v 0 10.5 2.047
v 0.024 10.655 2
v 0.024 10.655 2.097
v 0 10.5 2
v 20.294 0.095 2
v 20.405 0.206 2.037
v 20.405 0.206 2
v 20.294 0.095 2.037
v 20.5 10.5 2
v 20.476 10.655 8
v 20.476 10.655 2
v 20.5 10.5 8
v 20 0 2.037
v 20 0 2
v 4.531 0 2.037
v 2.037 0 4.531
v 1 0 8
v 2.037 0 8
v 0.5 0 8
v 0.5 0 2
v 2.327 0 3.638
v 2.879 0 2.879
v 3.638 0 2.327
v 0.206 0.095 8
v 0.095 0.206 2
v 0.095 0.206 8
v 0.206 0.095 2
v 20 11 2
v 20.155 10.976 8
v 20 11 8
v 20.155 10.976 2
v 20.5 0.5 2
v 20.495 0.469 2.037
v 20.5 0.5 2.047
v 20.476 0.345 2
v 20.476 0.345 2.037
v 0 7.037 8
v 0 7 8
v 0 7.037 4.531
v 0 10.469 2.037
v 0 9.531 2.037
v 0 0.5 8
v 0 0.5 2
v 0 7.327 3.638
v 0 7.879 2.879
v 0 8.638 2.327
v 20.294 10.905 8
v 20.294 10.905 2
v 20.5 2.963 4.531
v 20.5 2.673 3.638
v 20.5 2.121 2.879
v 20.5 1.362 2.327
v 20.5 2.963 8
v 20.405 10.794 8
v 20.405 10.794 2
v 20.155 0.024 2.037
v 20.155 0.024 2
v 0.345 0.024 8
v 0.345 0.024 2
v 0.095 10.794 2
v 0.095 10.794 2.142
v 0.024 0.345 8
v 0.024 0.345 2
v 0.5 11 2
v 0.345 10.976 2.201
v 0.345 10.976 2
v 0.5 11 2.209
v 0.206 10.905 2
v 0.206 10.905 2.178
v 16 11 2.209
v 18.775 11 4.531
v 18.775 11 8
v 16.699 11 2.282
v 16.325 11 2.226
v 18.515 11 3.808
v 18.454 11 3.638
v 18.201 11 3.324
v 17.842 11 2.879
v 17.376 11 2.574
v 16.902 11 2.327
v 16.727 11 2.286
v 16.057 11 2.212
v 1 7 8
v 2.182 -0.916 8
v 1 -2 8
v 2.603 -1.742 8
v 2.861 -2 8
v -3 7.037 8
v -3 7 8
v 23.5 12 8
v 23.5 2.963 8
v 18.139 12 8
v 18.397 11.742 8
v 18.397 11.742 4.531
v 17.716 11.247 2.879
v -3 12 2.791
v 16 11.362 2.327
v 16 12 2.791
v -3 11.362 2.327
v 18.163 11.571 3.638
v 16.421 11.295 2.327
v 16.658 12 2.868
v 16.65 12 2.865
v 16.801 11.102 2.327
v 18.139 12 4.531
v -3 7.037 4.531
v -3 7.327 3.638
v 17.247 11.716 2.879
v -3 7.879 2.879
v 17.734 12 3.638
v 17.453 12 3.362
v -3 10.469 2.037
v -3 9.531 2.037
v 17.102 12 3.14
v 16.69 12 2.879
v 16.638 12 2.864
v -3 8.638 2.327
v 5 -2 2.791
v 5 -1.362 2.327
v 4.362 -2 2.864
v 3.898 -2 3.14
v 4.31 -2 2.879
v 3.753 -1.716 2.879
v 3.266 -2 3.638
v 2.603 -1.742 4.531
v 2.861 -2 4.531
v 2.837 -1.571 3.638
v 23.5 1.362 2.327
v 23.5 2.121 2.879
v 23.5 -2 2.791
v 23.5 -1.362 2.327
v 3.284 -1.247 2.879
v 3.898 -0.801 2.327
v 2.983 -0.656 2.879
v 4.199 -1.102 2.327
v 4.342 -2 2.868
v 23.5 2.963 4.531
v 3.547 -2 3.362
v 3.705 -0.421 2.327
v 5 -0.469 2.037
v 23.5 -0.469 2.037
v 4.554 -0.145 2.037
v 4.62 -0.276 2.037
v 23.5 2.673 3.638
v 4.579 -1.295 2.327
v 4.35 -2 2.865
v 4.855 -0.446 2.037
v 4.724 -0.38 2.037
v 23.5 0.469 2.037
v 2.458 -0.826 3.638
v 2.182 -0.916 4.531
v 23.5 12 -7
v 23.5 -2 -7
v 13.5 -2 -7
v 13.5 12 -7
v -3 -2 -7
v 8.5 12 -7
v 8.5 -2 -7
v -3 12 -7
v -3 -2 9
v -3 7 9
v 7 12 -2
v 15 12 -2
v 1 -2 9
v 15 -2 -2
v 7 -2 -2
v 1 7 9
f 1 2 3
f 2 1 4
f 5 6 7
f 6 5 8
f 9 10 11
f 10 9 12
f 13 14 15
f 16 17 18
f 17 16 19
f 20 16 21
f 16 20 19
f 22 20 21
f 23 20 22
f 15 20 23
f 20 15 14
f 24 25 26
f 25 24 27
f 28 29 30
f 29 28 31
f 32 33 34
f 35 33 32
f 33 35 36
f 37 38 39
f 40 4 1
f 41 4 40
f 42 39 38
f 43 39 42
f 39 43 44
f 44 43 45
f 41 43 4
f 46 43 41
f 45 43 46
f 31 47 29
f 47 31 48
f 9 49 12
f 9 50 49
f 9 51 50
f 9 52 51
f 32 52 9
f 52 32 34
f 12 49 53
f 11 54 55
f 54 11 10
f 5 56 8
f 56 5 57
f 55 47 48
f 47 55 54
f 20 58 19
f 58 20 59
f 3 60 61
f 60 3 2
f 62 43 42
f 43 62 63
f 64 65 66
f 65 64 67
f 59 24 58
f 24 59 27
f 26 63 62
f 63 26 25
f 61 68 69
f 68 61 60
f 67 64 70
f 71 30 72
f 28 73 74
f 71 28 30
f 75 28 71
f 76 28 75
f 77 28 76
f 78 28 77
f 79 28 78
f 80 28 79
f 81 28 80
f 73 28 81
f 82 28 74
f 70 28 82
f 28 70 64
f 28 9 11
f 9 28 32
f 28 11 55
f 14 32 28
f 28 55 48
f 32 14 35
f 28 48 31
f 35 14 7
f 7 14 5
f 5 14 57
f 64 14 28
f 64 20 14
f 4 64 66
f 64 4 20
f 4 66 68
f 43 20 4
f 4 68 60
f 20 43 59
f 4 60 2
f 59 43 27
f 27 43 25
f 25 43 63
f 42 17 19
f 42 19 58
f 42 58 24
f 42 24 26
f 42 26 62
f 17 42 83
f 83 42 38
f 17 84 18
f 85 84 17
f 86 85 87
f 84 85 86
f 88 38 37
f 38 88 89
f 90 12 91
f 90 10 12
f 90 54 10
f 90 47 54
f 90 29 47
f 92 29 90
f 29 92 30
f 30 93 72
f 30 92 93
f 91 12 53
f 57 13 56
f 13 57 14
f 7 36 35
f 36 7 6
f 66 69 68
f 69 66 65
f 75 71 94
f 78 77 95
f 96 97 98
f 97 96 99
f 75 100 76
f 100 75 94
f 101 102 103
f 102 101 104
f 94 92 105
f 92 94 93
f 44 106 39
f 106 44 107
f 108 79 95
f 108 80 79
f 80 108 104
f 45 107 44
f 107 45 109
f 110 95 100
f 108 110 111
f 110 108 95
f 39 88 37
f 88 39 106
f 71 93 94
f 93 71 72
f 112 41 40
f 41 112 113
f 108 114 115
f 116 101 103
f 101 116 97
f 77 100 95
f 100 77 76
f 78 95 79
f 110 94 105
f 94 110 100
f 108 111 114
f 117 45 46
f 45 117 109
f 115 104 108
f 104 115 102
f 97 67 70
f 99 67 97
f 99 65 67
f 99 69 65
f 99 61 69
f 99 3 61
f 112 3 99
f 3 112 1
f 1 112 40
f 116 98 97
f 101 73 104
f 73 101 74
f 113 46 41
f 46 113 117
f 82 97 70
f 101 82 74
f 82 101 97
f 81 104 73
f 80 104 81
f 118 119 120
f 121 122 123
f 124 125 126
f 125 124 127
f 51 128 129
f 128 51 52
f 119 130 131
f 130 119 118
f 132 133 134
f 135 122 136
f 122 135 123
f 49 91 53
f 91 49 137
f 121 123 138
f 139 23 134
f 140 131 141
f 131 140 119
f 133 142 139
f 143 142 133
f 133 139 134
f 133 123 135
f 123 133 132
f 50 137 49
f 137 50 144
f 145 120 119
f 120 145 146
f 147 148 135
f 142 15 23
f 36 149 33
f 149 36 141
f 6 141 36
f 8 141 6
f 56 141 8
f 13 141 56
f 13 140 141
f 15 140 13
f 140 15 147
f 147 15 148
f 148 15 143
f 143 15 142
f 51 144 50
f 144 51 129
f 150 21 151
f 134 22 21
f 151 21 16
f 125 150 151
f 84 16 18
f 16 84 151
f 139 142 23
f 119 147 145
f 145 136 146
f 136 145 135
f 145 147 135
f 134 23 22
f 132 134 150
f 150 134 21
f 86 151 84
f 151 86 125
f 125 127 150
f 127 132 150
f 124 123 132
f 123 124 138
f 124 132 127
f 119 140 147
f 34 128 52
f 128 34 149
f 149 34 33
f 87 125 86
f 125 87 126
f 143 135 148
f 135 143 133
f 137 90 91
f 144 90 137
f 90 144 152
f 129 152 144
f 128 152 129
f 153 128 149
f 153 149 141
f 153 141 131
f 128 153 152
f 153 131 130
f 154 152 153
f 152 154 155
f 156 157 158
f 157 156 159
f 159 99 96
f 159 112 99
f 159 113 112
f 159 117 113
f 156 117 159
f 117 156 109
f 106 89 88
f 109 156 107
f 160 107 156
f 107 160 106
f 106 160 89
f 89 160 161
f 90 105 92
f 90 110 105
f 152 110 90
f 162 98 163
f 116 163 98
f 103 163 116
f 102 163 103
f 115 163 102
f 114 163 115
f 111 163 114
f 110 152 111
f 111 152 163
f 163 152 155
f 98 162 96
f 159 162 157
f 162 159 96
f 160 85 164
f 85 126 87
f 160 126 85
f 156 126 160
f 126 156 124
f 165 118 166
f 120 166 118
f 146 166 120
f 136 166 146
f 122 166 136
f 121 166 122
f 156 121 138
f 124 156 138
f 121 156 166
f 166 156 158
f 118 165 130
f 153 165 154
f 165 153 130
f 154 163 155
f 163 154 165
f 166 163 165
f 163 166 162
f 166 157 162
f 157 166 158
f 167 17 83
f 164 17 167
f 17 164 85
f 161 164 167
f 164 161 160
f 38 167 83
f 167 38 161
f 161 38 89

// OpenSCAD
// file: globals.scad
/*
Most things in this file is represented as one millimeter, so keep that in mind while changing things.
Some of the setting are not mm but at variables that you can set, such as 2*x=2x and you are setting what x is.
I will try to specify when things are variables and not exact measurements.
*/

obj_leg = 30;
leg_length = 5.5;
small_number = 0.001;
metal_core_rode_global = 5;


///////////////// number of holes /////////////////////
z_hole_number = 8;
other_holes = 8;

///////////////// Pins /////////////////////

//pins that poke out
ball_size = 10;
pin_height = 20;
pin_diameter = 6;


//holes
hole_ball_size = ball_size;
hole_pin_height = pin_height;
hole_pin_diameter = pin_diameter;

///////////////// Z THINGS /////////////////////

berring_slot_width = 7.5;
berring_slot_depth = 6.5;
metal_core_rode = 5;

///////////////// X THINGS /////////////////////

//male dove tails
max_width=8;
min_width=5;
depth=5;
height=obj_leg/2;

//female dove tails, this is found on the y mounts
girl_max_width=11;
girl_min_width=5;
girl_depth=5;
girl_height=obj_leg;


///////////////// Y THINGS /////////////////////
/*
The Y is so normal that all of those global variables at the top should change all of the setting in it, this section is set her incase there are variables set in the future development of this project.
*/
// file: include.scad
//////////////////      END SECTION       //////////////////

	module added_pins(){
		difference(){
			union(){
				translate([30/(15/4),obj_leg*leg_length,30/(15/4)]) pin();
				translate([30/(15/4)+14.5,obj_leg*leg_length,30/(15/4)+14]) pin();
			}
			union(){
							translate([30/(15/4)+13.5,obj_leg*leg_length-20,30/(15/4)+5])cube(size=[2,40,15]);
							translate([30/(15/4)+7.5,obj_leg*leg_length-20,30/(15/4)+15])rotate([0,90,0]) cube(size=[2,40,15]);	

							translate([30/(15/4)-1,obj_leg*leg_length-20,30/(15/4)-8])cube(size=[2,40,15]);
							translate([30/(15/4)-10,obj_leg*leg_length-20,30/(15/4)+1])rotate([0,90,0]) cube(size=[2,40,15]);
			}
		}
	}
	module taken_pins() {
		translate([30/(15/4)+14,obj_leg*leg_length-10,30/(15/4)]) mirror_pin();
		translate([30/(15/4),obj_leg*leg_length-10,30/(15/4)+15]) mirror_pin();
	}


//////////////////      OTHER STUFF       //////////////////

	module holes() {
		rotate([0,0,90]) for(y=[0:other_holes])
		translate([obj_leg+y*15,-15.5,7.5]) union() {
			translate([7.5,0,15]) hole_up();
			hole_down();
		}
	}
	module extend_holes() {
	module top(){
		rotate([0,0,90]) for(y=[0:other_holes+1])
		translate([(30/4)+y*15,-15.5,7.5]) union() {
			translate([7.5,0,15]) hole_up();
		}
	}
	module bottom(){
		rotate([0,0,90]) for(y=[0:other_holes+2])
		translate([(30/4)+y*15,-15.5,7.5]) union() {
			hole_down();
		
}
	}
	union(){
		top();
		bottom();
	}
	}

	module hole() {
		union() {
			rotate([90, 90, 0]) cylinder(h=40, d=hole_pin_diameter, center=true);
			translate([0,7.5,0]) sphere(d=hole_ball_size);
			translate([0,-6,0]) sphere(d=hole_ball_size);
		}
	}
	module hole_up() {
		union() {
			rotate([90, 90, 0]) cylinder(h=40, d=hole_pin_diameter, center=true);
			translate([0,7.5,10]) cylinder(h=hole_pin_height, d=hole_pin_diameter, center=true);
			translate([0,-6,10]) cylinder(h=hole_pin_height, d=hole_pin_diameter, center=true);
			translate([0,7.5,0]) sphere(d=hole_ball_size);
			translate([0,-6,0]) sphere(d=hole_ball_size);
		}
	}
	module hole_down() {
		union() {
			rotate([90, 90, 0]) cylinder(h=40, d=hole_pin_diameter, center=true);
			translate([0,7.5,-10]) cylinder(h=hole_pin_height, d=hole_pin_diameter, center=true);
			translate([0,-6,-10]) cylinder(h=hole_pin_height, d=hole_pin_diameter, center=true);
			translate([0,7.5,0]) sphere(d=hole_ball_size);
			translate([0,-6,0]) sphere(d=hole_ball_size);
		}
	}
	module pin() {
		union() {
			rotate([90, 90, 0]) cylinder(h=pin_height, d=pin_diameter, center=true);
			translate([0,7.5,0]) sphere(d=ball_size);
		}
	}

	module mirror_pin() {
		rotate([90, 90, 0]) cylinder(h=hole_pin_height+small_number, d=hole_pin_diameter, center=true);
		translate([0,-(pin_height-(ball_size/2)),0]) sphere(d=ball_size);
	}


//////////////////      SOME RACK AND Z THINGS       //////////////////

module z_holes() {
    rotate([0,-90,0]) for(z=[0:z_hole_number])
    translate([22.5+z*15,16,-12])
        hole();
}

module pin_cuts() {
	union(){
		cube(size=[2,10,40], center=true);
		rotate([0,0,90]) cube(size=[2,10,40], center=true);
	}
}
module pin_uncut() {
	union(){
		rotate([0, 0, 90]) cylinder(h=hole_pin_height, d=hole_pin_diameter, center=true);
		translate([0,0,10]) sphere(d=ball_hole);
	}
}


module pin_out() {
	union(){
		rotate([0, 0, 90]) cylinder(h=pin_height, d=pin_diameter, center=true);
		translate([0,0,10]) sphere(d= ball_size);
	}
}


module pins_z(){
	difference() {
		pin_out();
		pin_cuts();
	}
}
//////////////////      RACK AND SLIDE     ///////////////////

module straight_pins() {
	for(z=[0:((((obj_leg*leg_length)*2)-(obj_leg*2))/3)/14.5]) rotate([-90,0,0]) translate([z*15,30/(15/4),14]) pins_z();
	for(z=[0:((((obj_leg*leg_length)*2)-(obj_leg*2))/3)/14.5]) rotate([-90,0,0]) translate([z*15,30/(15/4)-14,14]) pins_z();
}
module stagger_pins() {
	for(z=[0:((((obj_leg*leg_length)*2)-(obj_leg*2))/3)/14.5]) rotate([-90,0,0]) translate([z*15,30/(15/4),14]) pins_z();
	for(z=[0:((((obj_leg*leg_length)*2)-(obj_leg*2))/3)/14.5]) rotate([-90,0,0]) translate([z*15+7,30/(15/4)-14,14]) pins_z();
}


//////////////////      DOVE TAIL       //////////////////

module male_dovetail(height) {
	dovetail_3d(max_width,min_width,depth,height);
}

module dovetail_3d(max_width=11, min_width=5, depth=5, height=30) {
	linear_extrude(height=height, convexity=2)
		dovetail_2d(max_width,min_width,depth);
}

module dovetail_2d(max_width=11, min_width=5, depth=5) {
	angle=atan((max_width/2-min_width/2)/depth);
	echo("angle: ", angle);
	polygon(paths=[[0,1,2,3,0]], points=[[-min_width/2,0], [-max_width/2,depth], [max_width/2, depth], [min_width/2,0]]);
}

//bow tie
	module tie_end(height){
				rotate([0,0,0]) translate([0,-0.01,((obj_leg/2)/2)]) male_dovetail(height);
				rotate([0,90,0]) translate([0,-0.01,((obj_leg/2)/2)]) male_dovetail(height);
				rotate([0,180,0]) translate([0,-0.01,((obj_leg/2)/2)]) male_dovetail(height);
				rotate([0,-90,0]) translate([0,-0.01,((obj_leg/2)/2)]) male_dovetail(height);
	}

module bow_support(){
	difference(){
		intersection(){
			translate([-15,0,-15]) cube([30,9,30]);
			scale([1.05,1.05,1.05]) rotate([0,45,0]) tie_end();
		}
		cube([29.2,29.2,29.2], center=true);
	}
}

	module wrap(units){
	for (y = [-1:units-2]) // two iterations, z = -1, z = 1
	{
			translate([15, (y*30)+15, 15]){
			for (r = [0:4]) // two iterations, z = -1, z = 1
			{
				rotate([0,r*90,0]) translate([0,15,15]) rotate([-90,0,0])male_dovetail(height=30);
			}
		}
	}
	}
// main file
include <include.scad>;
include <globals.scad>;
$fn=20;
switch_length = 20.5;
switch_depth = 6;
switch_width = 11;
radius = 1;

module button(){
	difference(){
		hull(){
			translate([radius/2,radius/2,0]) cylinder(h=switch_depth, d=radius);
			translate([switch_length-radius/2,radius/2,0]) cylinder(h=switch_depth, d=radius);
			translate([radius/2,switch_width-radius/2,0]) cylinder(h=switch_depth, d=radius);
			translate([switch_length-radius/2,switch_width-radius/2,0]) cylinder(h=switch_depth, d=radius);
		}
		//union(){
		//	translate([radius/2,radius/2,0]) cylinder(h=switch_depth, d=3);
		//	translate([switch_length-radius/2,switch_width-radius/2,0]) cylinder(h=switch_depth, d=3);
		//}
	}
}
module button_plus(){
	button();
	hull(){
		translate([-5,10,3]) sphere(r=3);
		translate([-5,10,10]) sphere(r=3);
		translate([16,10,3]) sphere(r=3);
		translate([16,10,10]) sphere(r=3);
	}
	
	hull(){
		translate([25,0,3]) sphere(r=3);
		translate([25,0,10]) sphere(r=3);
		translate([5,0,3]) sphere(r=3);
		translate([5,0,10]) sphere(r=3);
	}
}

translate([-3,-2,8]) cube([4,9,1]);

difference(){
	difference(){
		translate([-3,-2,-7]) cube([switch_length+6,switch_width+3,switch_depth+9]);
		translate([0,0,2]) button_plus();
	}
	#rotate([90,0,0]) translate([switch_width,-7,-13]) male_dovetail(height=15);
}
